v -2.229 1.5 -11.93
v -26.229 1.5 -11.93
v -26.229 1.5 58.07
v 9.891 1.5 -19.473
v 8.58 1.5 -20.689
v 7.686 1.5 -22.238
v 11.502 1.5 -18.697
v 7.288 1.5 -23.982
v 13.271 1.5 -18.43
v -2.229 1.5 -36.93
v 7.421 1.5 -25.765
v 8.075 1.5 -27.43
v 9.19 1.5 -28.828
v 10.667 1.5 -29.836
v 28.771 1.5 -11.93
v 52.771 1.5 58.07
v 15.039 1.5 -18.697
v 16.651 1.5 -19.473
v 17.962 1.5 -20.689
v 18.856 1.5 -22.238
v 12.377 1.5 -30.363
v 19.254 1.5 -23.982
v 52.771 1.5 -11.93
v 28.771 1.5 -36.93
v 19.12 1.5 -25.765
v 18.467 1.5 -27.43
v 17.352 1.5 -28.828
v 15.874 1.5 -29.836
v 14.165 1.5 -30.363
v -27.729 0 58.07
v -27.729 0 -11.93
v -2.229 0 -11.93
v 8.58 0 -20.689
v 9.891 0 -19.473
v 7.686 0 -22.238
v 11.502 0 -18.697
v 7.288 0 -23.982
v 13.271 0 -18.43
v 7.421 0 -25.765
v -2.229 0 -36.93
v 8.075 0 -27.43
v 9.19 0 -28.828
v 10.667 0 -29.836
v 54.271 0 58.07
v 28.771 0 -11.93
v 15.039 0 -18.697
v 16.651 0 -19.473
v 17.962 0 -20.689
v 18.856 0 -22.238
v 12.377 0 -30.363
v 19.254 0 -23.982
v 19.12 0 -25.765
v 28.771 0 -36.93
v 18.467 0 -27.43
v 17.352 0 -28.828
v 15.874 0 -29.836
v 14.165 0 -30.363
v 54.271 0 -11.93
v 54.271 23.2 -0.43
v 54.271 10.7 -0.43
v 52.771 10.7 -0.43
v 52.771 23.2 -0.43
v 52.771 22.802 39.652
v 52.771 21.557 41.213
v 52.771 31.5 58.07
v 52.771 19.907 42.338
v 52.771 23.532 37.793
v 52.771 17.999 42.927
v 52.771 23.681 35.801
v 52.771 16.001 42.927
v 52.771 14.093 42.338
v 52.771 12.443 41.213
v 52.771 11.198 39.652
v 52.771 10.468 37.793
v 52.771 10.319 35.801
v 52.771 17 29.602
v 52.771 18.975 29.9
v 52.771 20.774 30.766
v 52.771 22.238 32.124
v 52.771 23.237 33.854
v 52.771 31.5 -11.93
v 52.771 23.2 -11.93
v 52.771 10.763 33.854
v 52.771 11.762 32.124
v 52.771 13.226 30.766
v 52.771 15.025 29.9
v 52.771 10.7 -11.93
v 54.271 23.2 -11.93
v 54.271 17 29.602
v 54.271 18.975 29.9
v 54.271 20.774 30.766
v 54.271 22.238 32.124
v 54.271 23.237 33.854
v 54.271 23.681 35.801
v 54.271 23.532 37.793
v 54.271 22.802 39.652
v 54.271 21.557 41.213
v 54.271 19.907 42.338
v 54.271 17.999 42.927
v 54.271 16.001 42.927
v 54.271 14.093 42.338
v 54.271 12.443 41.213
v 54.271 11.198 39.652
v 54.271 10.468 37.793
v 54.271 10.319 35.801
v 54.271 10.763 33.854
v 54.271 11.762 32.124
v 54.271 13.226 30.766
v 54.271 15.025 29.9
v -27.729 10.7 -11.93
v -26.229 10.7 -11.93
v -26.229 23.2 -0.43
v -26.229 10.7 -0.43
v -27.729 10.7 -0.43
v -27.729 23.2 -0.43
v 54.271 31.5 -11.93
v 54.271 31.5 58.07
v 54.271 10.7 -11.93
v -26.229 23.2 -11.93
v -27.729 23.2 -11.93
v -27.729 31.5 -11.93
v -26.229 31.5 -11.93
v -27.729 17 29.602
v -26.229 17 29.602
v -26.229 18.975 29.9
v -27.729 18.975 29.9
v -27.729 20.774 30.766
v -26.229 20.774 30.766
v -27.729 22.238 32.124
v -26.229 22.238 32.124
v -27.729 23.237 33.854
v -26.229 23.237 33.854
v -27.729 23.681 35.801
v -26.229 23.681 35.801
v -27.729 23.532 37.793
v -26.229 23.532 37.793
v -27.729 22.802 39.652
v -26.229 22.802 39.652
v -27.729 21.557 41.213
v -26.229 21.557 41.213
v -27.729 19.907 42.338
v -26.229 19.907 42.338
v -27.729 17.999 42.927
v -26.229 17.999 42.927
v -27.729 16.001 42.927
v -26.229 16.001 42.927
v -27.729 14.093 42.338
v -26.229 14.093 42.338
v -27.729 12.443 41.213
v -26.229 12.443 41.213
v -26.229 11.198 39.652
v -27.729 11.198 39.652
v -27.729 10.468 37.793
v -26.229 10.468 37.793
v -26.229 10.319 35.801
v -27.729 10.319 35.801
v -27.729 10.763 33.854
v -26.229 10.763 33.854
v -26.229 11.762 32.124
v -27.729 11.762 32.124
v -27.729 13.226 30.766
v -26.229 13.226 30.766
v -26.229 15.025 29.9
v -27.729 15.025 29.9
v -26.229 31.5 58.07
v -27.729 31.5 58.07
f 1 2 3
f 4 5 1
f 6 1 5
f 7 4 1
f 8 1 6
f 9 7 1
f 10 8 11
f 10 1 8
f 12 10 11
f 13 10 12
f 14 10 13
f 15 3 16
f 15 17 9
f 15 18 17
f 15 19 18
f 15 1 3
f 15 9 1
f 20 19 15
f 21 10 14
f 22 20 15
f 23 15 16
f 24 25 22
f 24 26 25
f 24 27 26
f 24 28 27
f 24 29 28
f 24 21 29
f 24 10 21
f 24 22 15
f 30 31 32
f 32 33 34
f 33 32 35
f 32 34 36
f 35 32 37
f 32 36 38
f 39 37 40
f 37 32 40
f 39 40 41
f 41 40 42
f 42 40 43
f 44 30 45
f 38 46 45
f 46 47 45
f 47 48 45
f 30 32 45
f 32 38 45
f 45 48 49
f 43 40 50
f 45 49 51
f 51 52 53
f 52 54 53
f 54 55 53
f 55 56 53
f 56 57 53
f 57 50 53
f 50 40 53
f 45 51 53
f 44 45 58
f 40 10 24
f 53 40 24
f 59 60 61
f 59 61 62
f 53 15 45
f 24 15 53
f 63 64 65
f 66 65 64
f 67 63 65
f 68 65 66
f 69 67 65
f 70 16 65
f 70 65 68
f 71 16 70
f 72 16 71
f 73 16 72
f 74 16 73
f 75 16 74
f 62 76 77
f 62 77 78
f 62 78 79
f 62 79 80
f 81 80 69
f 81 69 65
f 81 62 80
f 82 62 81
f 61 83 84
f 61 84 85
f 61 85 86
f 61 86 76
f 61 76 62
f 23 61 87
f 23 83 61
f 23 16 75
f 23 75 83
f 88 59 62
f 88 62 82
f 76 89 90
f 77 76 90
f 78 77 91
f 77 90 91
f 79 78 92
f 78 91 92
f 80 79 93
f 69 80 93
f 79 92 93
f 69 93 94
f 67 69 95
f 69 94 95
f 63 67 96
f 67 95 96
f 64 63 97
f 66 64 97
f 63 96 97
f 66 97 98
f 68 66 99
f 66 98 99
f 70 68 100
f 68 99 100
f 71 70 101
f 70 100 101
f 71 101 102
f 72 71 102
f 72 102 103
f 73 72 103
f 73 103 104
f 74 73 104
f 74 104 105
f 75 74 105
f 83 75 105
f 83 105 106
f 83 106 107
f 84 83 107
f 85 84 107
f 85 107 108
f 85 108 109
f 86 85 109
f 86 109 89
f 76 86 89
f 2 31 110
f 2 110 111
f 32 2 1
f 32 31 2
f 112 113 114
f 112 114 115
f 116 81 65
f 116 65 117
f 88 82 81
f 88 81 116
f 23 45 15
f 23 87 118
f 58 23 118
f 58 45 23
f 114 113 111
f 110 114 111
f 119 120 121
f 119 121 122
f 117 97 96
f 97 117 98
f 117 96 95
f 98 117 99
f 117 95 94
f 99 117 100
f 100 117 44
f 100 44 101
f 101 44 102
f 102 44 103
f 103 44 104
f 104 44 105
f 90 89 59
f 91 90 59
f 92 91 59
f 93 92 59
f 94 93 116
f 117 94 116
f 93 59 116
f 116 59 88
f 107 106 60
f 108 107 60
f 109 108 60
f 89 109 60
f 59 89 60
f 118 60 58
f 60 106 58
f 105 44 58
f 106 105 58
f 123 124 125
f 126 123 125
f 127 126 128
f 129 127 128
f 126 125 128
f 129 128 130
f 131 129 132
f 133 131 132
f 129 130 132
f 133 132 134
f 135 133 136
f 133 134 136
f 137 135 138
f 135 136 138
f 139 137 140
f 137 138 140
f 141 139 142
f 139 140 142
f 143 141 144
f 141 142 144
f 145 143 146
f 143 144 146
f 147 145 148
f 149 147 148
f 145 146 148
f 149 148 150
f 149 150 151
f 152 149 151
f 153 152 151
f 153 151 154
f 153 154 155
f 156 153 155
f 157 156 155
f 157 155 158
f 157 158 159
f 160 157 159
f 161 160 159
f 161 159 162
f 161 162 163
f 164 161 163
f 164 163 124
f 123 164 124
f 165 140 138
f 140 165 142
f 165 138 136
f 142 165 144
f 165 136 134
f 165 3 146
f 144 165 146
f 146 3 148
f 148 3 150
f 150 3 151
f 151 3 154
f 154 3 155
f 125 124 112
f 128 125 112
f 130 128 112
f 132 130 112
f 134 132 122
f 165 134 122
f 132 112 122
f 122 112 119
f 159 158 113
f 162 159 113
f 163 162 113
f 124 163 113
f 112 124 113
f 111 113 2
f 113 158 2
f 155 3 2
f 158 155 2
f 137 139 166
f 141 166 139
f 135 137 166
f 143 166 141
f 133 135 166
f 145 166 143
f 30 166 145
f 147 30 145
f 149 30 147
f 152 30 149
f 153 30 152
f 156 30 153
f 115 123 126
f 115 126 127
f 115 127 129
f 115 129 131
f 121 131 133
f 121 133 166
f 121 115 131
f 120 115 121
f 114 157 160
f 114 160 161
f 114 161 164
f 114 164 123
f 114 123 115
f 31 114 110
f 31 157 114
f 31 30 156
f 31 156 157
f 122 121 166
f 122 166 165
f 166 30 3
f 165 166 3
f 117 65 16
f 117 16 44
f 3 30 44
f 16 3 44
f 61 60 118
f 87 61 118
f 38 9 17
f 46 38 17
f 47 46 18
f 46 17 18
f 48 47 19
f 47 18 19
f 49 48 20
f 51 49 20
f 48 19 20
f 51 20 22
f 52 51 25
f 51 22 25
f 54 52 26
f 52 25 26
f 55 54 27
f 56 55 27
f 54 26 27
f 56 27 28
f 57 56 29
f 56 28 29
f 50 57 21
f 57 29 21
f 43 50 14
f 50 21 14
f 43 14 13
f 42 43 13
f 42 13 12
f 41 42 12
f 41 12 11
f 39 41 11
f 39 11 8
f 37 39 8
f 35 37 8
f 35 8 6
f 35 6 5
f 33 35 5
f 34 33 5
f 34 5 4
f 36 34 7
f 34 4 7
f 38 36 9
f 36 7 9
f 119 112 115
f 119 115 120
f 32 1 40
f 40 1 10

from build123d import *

# Parameters (mm, degrees)
SKETCH1_W           = 82
SKETCH1_H           = 70
BOSS_EXTRUDE1_DEPTH = 1.5
SKETCH2_W           = 1.5
SKETCH2_H           = 70
BOSS_EXTRUDE2_DEPTH = 30
SKETCH3_W           = 11.5
SKETCH3_H           = 12.5
CUT_EXTRUDE1_DEPTH  = 90
SKETCH4_R           = 6.7
CUT_EXTRUDE2_DEPTH  = 90
SKETCH5_W           = 31
SKETCH5_H           = 25
SKETCH5_R           = 6
BOSS_EXTRUDE3_DEPTH = 1.5


with BuildPart() as part:
    # Sketch1 → Boss-Extrude1 (new body)
    with BuildSketch(Plane(origin=(0, 0, 0), x_dir=(1, 0, 0), z_dir=(0, 1, 0))):
        with Locations((13.270768006, -23.069981584)):
            Rectangle(SKETCH1_W, SKETCH1_H)
    extrude(amount=BOSS_EXTRUDE1_DEPTH)

    # Sketch2 → Boss-Extrude2 (add)
    with BuildSketch(Plane(origin=(0, 1.5, 0), x_dir=(1, 0, 0), z_dir=(0, 1, 0))):
        with Locations((53.520768006, -23.069981584)):
            Rectangle(SKETCH2_W, SKETCH2_H)
        with Locations((-26.979231994, -23.069981584)):
            Rectangle(SKETCH2_W, SKETCH2_H)
    extrude(amount=BOSS_EXTRUDE2_DEPTH)

    # Sketch3 → Cut-Extrude1 (cut)
    with BuildSketch(Plane(origin=(54.270768006, 0, 0), x_dir=(0, 0, -1), z_dir=(1, 0, 0))):
        with Locations((6.180018416, 16.95)):
            Rectangle(SKETCH3_W, SKETCH3_H)
    extrude(amount=-CUT_EXTRUDE1_DEPTH, mode=Mode.SUBTRACT)

    # Sketch4 → Cut-Extrude2 (cut)
    with BuildSketch(Plane(origin=(54.270768006, 0, 0), x_dir=(0, 0, -1), z_dir=(1, 0, 0))):
        with Locations((-36.301843463, 17)):
            Circle(SKETCH4_R)
    extrude(amount=-CUT_EXTRUDE2_DEPTH, mode=Mode.SUBTRACT)

    # Sketch5 → Boss-Extrude3 (add)
    with BuildSketch(Plane(origin=(0, 1.5, 0), x_dir=(1, 0, 0), z_dir=(0, 1, 0))):
        with Locations((13.270768006, 24.430018416)):
            Rectangle(SKETCH5_W, SKETCH5_H)
        with Locations(Location((13.270768006, 24.430018416, 0), (0, 0, 270))):
            Circle(SKETCH5_R, mode=Mode.SUBTRACT)
    extrude(amount=-BOSS_EXTRUDE3_DEPTH)


solid = part.part
